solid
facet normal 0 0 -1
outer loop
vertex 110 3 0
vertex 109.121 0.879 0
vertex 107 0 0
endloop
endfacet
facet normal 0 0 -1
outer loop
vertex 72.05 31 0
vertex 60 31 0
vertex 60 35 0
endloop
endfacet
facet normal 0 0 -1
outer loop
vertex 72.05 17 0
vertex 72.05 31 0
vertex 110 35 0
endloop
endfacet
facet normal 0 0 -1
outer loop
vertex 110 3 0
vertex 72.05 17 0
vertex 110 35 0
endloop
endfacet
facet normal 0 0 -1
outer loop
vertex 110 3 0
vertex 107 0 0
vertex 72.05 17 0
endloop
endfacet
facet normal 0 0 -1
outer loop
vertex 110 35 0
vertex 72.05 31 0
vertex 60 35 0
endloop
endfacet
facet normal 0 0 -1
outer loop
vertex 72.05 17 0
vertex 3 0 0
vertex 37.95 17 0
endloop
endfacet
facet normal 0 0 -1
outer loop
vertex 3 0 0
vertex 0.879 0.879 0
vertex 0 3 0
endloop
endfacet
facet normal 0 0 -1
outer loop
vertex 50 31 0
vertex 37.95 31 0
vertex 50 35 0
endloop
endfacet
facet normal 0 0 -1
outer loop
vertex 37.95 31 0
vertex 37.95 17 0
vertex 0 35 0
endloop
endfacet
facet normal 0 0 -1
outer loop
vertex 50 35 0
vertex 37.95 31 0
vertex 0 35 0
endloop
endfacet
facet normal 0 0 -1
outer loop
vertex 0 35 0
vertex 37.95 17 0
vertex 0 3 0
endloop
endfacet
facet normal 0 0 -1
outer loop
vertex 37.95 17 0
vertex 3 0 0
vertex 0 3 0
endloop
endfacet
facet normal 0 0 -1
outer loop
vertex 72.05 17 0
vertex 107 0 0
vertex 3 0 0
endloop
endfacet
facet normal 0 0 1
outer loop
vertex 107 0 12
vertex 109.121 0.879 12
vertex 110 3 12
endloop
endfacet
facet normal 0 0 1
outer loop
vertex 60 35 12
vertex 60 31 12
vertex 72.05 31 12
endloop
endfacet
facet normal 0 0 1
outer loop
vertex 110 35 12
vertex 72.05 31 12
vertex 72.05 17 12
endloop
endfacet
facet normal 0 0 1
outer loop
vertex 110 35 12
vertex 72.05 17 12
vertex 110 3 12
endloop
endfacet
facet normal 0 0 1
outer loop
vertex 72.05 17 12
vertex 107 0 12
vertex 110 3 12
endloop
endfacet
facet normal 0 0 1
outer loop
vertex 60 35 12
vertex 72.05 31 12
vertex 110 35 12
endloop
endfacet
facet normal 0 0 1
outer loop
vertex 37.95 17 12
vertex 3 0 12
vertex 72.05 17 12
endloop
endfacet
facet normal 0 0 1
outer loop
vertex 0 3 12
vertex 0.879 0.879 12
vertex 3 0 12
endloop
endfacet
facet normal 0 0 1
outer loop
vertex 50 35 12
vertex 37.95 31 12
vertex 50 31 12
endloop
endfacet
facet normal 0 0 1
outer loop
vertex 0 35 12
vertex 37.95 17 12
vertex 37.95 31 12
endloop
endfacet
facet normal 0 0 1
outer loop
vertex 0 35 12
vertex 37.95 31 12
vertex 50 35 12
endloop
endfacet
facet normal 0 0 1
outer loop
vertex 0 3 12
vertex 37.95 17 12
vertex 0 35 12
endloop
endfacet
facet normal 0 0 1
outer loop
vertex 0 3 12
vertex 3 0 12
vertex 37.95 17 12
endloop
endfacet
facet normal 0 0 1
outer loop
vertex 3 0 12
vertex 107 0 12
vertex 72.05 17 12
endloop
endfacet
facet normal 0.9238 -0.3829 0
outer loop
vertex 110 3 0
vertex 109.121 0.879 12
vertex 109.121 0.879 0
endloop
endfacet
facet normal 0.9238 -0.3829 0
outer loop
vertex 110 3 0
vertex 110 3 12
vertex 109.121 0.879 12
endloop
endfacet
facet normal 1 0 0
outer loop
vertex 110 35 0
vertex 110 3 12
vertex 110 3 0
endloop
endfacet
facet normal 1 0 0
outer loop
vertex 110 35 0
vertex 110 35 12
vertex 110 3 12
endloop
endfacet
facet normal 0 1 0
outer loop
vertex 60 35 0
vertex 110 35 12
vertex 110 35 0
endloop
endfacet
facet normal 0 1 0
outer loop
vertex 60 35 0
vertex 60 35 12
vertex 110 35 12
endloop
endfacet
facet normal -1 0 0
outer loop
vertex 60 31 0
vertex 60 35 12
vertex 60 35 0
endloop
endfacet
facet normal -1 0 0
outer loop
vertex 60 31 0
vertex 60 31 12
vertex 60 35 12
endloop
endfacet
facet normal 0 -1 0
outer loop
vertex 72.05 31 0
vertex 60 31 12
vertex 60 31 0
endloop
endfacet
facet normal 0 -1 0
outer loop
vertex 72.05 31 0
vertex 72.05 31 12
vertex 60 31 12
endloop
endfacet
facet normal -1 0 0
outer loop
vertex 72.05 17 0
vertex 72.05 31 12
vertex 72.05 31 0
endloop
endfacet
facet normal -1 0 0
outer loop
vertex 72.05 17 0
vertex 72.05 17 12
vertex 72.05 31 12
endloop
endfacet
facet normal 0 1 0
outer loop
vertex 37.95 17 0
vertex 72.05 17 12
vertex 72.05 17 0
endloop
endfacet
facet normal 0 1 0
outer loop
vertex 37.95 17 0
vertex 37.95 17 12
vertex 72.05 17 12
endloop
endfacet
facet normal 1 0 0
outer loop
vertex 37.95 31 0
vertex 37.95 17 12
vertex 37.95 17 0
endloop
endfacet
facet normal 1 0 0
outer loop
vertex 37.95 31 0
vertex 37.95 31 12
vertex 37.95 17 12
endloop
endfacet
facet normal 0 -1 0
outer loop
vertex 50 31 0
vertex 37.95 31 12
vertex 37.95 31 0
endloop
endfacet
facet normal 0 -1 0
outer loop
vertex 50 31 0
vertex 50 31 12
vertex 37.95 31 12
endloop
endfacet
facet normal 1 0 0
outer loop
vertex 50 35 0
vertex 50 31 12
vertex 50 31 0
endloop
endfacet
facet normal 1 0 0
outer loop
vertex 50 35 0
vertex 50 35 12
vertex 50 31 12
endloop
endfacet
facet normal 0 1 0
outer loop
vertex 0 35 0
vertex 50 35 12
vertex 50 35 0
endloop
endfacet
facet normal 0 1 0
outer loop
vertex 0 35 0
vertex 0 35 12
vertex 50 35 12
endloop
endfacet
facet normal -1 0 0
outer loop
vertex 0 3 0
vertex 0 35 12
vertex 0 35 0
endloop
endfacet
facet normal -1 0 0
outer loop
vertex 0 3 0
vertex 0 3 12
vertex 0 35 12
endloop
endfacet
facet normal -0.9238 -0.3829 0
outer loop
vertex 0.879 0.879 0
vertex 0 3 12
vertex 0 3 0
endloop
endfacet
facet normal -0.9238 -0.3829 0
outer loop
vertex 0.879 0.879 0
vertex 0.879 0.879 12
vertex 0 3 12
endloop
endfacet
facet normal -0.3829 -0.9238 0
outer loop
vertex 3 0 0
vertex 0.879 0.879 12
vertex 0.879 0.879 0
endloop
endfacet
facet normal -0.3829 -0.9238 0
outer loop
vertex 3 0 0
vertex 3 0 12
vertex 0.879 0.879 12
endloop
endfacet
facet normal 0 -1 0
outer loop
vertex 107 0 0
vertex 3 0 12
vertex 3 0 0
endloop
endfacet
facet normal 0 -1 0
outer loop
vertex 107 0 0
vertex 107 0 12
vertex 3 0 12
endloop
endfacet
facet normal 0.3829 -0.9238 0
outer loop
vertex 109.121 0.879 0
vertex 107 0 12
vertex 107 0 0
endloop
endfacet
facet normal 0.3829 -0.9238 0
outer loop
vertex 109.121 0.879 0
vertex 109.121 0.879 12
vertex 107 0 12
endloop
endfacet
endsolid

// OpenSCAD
$fn = 32;

// ----------------------------------------------------------------------
// Window plate: 110 x 35 mm, 1 open windows
// ----------------------------------------------------------------------

// --- parameters (mm) ---
profile_height = 12;      // extrusion height
profile_points = 16;      // points of the closed outline

profile = [[0, 3], [0.879, 0.879], [3, 0], [107, 0], [109.121, 0.879], [110, 3], [110, 35], [60, 35], [60, 31], [72.05, 31], [72.05, 17], [37.95, 17], [37.95, 31], [50, 31], [50, 35], [0, 35]];  // single closed polygon, 16 points, counter clockwise

// --- the one profile operation ---
linear_extrude(height = profile_height) polygon(points = profile);
